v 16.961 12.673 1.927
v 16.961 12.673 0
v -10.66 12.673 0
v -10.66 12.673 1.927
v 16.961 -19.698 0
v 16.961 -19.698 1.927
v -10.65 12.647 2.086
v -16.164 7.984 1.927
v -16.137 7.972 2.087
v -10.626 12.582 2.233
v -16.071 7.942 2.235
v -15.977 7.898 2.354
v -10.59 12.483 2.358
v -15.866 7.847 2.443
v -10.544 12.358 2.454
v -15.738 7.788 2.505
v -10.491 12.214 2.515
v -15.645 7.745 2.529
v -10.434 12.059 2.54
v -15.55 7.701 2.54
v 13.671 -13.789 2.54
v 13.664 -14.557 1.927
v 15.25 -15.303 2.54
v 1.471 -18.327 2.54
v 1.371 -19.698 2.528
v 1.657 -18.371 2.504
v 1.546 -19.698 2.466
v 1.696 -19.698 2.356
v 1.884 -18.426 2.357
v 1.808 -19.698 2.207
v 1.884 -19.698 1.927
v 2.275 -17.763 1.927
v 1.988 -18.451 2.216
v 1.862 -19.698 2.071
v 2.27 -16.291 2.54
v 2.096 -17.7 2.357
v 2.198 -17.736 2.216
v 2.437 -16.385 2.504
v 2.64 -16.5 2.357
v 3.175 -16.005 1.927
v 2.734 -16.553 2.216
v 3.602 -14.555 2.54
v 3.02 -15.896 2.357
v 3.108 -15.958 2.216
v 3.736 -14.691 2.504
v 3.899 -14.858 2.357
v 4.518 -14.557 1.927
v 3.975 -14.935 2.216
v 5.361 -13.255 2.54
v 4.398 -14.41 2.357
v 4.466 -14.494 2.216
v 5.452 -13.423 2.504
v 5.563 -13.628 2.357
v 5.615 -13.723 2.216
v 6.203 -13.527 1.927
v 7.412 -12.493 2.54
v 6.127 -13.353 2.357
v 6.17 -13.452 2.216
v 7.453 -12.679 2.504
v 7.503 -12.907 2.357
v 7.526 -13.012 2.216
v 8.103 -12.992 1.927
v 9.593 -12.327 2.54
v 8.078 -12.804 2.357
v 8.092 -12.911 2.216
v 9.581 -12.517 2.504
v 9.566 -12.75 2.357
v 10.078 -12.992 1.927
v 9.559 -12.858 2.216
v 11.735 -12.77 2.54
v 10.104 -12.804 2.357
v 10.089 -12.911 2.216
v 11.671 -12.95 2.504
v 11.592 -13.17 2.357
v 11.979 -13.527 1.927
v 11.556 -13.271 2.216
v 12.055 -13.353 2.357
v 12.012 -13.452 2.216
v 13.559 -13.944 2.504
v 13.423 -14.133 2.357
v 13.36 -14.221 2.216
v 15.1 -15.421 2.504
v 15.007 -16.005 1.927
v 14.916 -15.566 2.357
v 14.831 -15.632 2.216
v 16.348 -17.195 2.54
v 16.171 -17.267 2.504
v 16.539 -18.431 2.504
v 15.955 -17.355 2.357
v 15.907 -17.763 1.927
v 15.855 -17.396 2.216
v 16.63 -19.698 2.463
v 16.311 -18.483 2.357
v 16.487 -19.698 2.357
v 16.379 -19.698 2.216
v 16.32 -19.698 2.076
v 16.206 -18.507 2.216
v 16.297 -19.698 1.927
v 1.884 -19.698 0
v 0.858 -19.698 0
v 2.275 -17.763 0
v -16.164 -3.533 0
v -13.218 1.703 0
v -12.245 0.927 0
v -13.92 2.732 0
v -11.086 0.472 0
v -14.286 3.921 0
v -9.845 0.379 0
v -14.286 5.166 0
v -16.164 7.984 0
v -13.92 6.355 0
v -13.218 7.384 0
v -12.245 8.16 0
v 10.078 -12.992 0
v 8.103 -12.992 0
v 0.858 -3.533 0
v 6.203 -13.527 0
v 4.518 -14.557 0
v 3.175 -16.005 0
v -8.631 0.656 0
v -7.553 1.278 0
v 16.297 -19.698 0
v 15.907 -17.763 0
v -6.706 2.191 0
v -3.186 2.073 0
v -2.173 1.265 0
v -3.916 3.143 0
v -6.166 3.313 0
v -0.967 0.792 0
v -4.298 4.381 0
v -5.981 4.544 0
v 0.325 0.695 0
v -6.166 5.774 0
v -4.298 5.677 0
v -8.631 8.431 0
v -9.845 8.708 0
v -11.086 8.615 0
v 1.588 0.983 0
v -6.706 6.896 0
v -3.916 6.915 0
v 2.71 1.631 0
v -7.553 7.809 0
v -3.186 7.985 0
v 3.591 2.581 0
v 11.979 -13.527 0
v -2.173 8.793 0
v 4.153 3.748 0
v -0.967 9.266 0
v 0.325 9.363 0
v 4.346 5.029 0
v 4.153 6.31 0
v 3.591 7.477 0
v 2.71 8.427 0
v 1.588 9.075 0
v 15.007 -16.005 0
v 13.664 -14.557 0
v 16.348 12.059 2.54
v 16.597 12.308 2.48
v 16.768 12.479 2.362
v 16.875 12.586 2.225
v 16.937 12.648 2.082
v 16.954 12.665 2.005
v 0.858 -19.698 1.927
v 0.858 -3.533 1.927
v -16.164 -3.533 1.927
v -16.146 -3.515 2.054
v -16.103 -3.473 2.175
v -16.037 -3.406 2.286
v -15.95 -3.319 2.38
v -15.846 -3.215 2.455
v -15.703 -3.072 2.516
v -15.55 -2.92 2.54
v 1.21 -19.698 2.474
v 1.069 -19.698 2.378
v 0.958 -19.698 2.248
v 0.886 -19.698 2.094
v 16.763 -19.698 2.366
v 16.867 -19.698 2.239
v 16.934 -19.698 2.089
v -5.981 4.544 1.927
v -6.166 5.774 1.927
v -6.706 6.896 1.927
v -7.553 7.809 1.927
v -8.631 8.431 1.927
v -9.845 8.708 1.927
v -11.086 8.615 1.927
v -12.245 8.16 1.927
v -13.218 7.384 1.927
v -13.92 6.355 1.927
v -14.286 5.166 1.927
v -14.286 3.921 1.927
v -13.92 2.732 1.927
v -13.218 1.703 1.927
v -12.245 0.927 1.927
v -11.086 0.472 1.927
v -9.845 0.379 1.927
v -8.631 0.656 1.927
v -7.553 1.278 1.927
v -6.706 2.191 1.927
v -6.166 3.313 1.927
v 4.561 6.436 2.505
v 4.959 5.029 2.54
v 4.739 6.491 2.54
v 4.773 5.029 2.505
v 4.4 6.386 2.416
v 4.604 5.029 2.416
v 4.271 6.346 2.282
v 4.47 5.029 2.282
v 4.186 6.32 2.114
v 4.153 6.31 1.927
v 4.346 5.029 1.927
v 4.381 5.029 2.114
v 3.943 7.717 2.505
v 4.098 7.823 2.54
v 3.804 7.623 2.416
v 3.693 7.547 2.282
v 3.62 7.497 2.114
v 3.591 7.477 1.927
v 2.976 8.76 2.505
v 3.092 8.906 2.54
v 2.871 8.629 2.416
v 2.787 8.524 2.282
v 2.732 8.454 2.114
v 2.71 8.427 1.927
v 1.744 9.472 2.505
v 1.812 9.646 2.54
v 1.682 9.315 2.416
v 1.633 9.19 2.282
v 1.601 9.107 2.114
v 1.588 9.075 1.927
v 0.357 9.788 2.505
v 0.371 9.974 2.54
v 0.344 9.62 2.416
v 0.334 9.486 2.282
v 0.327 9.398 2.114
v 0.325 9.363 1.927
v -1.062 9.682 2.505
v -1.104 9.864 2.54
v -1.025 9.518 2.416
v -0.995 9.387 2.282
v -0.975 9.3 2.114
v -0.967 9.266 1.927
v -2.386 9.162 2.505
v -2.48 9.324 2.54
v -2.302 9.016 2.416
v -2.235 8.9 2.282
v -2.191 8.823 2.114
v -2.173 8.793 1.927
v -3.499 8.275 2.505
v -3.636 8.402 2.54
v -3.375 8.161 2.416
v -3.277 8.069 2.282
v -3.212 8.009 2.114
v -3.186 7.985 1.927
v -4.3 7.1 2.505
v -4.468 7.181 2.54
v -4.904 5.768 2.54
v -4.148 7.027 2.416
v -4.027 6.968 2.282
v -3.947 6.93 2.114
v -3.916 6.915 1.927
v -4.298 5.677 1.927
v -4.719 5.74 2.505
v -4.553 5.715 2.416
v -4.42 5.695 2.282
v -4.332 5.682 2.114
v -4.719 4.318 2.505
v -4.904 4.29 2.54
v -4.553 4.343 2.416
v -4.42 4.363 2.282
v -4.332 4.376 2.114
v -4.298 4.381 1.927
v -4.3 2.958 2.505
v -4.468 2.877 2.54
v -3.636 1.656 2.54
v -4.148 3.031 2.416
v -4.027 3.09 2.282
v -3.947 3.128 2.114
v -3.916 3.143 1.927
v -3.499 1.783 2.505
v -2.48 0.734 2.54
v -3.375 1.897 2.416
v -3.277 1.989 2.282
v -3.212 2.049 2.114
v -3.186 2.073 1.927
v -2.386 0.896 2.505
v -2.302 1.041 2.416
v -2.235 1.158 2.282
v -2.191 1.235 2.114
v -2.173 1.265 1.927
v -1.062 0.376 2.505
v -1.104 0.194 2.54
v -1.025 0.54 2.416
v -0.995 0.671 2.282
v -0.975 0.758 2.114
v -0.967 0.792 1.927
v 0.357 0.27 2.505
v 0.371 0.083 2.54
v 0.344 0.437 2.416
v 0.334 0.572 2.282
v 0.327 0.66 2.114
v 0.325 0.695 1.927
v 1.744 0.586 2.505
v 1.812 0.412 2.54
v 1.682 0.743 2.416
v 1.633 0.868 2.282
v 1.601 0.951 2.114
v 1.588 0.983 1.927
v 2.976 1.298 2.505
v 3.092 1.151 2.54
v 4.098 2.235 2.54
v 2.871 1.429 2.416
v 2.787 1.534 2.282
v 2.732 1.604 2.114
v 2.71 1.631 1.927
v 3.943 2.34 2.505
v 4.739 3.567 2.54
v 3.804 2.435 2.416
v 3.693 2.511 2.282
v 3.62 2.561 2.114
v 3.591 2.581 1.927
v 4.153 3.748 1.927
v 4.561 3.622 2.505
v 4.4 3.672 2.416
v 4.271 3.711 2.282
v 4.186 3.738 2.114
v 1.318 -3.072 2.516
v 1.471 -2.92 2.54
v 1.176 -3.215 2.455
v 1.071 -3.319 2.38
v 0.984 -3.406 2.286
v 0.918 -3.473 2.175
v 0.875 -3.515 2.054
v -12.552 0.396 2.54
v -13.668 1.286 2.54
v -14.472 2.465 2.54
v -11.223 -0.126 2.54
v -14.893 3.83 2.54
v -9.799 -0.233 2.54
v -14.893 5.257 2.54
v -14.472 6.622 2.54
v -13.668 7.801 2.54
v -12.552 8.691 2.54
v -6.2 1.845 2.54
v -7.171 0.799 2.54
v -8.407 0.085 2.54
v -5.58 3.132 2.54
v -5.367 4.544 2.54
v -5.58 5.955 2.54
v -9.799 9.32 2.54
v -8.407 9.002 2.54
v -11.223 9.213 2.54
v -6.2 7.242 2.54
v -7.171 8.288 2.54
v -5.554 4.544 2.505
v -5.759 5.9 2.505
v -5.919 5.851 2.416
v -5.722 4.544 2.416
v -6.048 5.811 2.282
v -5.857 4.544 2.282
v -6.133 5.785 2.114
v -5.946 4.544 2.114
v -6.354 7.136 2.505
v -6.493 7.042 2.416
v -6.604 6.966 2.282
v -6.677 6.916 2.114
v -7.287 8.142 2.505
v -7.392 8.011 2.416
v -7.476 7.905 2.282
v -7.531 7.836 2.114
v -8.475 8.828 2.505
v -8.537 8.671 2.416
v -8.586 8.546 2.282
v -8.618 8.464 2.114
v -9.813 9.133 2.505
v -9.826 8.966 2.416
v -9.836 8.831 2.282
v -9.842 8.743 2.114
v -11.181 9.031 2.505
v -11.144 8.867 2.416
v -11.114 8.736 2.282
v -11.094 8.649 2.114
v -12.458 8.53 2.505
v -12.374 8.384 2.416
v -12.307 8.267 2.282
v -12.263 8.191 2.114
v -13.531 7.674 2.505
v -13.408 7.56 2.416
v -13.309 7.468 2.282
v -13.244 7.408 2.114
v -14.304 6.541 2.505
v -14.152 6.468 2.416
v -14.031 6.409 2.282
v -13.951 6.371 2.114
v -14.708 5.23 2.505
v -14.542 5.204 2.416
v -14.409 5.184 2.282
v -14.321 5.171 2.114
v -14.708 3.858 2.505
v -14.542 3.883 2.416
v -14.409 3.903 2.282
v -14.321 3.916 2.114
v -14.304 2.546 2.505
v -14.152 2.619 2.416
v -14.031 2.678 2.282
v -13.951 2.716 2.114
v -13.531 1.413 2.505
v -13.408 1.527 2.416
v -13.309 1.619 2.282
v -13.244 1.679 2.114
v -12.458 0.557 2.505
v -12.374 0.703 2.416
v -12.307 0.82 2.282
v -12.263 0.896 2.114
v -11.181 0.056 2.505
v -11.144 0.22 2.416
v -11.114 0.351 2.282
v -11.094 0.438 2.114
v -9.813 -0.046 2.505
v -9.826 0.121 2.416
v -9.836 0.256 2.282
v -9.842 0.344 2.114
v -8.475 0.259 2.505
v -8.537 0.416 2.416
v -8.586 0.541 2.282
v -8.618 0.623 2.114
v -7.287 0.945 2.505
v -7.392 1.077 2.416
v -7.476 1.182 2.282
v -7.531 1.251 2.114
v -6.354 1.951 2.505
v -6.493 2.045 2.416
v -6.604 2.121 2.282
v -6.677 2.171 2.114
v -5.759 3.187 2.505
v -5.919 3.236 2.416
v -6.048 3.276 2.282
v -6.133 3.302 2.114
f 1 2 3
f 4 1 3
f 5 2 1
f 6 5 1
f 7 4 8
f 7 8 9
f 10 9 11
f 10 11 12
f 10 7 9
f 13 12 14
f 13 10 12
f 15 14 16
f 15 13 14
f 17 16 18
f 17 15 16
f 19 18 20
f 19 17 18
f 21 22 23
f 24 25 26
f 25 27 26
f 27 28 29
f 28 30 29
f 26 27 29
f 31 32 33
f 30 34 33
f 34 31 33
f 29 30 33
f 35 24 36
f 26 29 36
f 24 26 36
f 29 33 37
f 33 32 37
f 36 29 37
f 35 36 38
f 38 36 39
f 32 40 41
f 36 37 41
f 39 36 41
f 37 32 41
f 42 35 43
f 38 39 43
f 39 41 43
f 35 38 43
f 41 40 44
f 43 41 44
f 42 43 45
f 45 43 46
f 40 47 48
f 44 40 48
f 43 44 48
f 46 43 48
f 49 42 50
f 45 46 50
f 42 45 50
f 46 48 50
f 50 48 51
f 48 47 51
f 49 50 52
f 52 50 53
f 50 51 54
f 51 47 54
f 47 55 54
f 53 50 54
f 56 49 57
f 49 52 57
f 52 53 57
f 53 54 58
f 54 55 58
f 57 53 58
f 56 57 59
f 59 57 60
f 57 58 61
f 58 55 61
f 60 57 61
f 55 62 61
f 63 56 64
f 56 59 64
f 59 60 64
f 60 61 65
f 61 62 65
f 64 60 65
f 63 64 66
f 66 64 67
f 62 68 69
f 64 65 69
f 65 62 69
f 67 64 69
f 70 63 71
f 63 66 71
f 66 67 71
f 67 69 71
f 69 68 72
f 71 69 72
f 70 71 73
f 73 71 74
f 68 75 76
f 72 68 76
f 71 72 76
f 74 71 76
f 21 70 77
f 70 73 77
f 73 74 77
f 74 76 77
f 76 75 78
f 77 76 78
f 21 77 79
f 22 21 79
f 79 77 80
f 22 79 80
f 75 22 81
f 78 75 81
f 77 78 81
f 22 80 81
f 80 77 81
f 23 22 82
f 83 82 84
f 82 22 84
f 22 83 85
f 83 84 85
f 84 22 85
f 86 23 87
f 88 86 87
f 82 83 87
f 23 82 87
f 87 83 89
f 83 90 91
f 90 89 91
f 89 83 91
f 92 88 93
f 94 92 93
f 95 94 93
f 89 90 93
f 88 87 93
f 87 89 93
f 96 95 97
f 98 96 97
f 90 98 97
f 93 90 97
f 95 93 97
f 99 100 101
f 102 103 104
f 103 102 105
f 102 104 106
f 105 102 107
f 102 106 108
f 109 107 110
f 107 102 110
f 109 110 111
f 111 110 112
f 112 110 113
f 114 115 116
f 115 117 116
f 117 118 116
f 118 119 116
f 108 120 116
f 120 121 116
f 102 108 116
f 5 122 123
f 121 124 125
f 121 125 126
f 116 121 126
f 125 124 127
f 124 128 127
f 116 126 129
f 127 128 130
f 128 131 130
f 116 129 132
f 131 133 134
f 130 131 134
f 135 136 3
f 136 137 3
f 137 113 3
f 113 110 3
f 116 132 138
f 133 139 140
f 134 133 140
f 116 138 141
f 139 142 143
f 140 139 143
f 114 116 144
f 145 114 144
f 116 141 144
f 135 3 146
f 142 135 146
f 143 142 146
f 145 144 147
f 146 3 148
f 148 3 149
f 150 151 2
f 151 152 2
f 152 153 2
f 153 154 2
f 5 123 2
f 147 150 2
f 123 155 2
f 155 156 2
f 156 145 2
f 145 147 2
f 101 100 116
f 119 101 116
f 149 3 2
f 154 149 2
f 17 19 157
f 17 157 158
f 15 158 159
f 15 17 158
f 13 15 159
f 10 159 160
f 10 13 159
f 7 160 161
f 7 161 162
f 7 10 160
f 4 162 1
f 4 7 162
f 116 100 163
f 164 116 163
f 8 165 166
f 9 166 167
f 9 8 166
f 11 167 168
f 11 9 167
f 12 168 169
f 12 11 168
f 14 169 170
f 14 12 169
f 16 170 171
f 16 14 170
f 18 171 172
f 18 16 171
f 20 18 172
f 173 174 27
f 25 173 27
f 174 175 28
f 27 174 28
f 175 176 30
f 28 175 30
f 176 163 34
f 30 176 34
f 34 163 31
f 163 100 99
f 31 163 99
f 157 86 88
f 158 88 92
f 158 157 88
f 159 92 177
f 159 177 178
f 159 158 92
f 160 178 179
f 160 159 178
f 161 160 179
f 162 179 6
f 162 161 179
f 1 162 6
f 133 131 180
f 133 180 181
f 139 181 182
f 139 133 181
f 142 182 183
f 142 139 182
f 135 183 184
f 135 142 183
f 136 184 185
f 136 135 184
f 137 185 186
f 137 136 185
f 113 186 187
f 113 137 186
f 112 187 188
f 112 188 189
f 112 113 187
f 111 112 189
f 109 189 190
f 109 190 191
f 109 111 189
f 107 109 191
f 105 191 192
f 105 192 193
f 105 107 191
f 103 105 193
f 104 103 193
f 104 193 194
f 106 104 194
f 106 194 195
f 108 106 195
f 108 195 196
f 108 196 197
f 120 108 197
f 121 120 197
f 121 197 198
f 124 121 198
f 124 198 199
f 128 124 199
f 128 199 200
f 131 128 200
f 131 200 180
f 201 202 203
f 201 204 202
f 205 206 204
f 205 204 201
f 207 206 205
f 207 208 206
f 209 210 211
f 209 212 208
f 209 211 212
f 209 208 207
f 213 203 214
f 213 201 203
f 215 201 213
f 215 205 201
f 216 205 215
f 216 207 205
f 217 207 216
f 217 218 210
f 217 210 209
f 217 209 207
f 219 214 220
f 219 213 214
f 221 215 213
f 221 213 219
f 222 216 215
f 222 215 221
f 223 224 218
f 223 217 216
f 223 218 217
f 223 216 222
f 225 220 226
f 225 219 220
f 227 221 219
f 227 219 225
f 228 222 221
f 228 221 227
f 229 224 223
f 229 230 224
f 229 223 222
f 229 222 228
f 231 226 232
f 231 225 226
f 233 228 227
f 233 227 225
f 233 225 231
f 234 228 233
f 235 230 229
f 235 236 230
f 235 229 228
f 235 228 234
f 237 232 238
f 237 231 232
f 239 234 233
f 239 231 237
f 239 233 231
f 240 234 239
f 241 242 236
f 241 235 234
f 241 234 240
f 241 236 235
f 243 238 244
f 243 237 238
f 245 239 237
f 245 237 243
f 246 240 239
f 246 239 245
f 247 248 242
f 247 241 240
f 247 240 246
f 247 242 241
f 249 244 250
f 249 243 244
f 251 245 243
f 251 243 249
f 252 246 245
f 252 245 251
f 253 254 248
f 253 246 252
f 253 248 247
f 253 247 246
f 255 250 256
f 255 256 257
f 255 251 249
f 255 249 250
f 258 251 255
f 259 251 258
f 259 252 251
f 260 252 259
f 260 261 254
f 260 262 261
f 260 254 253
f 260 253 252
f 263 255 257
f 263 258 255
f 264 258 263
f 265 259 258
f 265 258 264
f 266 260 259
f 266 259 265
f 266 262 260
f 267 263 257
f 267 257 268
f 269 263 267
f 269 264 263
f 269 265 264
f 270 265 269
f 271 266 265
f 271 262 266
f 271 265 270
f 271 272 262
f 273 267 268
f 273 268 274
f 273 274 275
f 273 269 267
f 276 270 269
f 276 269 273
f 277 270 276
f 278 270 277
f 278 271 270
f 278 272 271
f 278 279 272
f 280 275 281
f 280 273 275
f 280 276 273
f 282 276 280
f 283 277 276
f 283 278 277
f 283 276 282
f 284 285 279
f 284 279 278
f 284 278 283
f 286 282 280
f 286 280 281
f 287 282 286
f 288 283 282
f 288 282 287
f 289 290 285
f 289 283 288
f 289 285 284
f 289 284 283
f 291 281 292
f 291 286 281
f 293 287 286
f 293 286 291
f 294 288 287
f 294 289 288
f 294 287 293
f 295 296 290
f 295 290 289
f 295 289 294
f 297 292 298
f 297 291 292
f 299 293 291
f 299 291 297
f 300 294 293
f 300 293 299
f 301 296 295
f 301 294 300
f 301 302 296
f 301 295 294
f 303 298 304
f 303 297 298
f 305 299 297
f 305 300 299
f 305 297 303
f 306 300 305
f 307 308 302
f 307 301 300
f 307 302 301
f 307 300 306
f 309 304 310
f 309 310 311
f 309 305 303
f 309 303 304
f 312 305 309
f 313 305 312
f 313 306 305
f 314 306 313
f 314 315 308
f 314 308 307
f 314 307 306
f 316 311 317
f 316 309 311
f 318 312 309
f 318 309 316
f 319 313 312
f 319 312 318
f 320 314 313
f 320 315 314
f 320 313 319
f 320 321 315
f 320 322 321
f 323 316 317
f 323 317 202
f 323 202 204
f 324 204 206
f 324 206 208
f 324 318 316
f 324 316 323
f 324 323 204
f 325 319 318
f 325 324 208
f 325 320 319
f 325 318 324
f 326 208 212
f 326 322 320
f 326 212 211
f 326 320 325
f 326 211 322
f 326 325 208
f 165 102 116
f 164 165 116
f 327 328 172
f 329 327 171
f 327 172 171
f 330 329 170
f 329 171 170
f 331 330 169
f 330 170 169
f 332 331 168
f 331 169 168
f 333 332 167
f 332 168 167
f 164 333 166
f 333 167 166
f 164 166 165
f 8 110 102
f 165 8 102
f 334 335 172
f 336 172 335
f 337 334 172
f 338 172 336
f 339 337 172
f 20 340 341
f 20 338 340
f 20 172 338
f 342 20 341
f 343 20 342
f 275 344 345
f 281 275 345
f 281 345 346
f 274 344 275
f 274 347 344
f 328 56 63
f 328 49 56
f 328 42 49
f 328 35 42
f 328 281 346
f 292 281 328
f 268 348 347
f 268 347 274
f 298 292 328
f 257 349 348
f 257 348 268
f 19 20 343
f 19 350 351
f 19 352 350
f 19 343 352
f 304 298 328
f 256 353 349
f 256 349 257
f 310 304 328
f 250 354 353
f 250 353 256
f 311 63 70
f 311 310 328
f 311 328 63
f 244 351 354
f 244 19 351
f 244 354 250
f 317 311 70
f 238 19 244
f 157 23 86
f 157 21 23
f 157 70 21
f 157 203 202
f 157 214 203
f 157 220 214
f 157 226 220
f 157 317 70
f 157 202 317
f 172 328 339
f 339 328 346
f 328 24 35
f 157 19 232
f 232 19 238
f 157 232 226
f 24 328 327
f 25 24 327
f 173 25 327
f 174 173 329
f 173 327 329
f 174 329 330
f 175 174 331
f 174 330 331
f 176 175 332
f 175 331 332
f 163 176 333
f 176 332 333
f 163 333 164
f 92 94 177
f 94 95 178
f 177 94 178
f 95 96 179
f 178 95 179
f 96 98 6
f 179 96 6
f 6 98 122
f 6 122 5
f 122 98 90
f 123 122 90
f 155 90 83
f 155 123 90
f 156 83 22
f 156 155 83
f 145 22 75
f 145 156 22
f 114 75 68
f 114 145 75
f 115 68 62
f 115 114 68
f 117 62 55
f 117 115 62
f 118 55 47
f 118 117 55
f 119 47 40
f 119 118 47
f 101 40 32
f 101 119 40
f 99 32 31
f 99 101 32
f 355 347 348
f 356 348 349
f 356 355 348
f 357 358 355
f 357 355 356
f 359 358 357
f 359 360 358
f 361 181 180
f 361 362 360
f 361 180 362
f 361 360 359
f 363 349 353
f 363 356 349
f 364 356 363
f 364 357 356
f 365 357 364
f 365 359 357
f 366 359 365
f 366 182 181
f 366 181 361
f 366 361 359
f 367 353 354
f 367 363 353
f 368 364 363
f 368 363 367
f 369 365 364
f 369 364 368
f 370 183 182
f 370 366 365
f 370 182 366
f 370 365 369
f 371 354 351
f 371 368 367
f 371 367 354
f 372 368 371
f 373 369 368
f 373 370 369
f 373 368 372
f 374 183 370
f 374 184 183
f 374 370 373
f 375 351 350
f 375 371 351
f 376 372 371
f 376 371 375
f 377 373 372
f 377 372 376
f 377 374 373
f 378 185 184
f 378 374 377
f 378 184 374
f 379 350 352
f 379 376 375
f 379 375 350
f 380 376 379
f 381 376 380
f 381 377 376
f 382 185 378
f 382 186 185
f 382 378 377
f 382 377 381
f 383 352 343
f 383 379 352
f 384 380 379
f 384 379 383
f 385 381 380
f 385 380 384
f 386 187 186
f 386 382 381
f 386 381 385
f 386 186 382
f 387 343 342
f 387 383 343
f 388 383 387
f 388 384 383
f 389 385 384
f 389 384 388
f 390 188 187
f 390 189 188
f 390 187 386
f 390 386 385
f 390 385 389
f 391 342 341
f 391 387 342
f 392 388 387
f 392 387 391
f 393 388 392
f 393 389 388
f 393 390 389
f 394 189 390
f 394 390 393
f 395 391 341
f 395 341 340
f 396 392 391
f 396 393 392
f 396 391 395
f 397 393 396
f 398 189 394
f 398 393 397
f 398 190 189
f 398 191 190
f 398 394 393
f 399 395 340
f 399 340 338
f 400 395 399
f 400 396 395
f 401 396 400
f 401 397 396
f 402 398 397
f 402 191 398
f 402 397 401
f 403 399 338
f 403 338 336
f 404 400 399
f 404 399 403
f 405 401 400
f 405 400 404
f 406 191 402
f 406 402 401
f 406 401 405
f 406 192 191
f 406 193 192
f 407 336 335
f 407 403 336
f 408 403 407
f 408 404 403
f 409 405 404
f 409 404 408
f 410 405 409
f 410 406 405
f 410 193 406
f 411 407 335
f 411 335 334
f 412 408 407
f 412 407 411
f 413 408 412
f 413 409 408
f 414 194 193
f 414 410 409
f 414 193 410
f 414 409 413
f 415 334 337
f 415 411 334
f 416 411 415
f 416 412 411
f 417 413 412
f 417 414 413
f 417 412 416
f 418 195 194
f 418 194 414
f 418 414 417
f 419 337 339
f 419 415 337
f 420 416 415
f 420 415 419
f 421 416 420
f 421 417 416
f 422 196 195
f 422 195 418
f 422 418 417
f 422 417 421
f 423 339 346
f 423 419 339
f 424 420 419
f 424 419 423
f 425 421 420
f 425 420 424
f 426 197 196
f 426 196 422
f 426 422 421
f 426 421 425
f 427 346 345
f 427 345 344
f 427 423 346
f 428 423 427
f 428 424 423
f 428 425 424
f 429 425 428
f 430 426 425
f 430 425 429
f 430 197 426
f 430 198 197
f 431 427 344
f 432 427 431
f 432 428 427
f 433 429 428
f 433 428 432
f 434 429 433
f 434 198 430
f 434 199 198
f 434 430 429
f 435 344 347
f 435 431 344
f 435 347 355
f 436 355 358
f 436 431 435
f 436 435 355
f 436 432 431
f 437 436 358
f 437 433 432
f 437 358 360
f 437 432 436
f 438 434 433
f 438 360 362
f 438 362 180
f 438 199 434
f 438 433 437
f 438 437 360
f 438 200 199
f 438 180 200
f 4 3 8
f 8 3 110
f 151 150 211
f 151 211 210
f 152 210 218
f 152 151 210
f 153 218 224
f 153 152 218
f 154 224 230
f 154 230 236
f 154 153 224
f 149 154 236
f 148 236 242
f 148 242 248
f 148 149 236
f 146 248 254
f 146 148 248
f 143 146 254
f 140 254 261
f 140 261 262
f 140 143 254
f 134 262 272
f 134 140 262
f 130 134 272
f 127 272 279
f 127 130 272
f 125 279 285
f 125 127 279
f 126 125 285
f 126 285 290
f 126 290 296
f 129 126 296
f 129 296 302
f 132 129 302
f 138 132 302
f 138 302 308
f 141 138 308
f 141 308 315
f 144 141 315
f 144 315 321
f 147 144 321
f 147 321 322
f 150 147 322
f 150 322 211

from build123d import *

# Parameters (mm, degrees)
F0_R         = 4.1761867796
F0_R_2       = 4.3460448691
F1_DEPTH     = 2.54
F2_DEPTH     = 12.7
F3_R         = 7.2200461369
F4_DEPTH     = 12.7
F7_T1_DEPTH  = 14.697191958
F7_T3_DEPTH  = 10.4099383433
F7_T5_DEPTH  = 30.8011159773
F7_T7_DEPTH  = 35.5510768625
F7_T9_DEPTH  = 17.7553157696
F7_T11_DEPTH = 18.6111496066
F7_T14_ANGLE = 198.1944914786
F7_T23_DEPTH = 17.7553157696
F7_T27_DEPTH = 18.6111496066


# Not quite as in the source:
# - a fillet or chamfer that OpenCascade refuses, or shapes differently, is made with other operations: its cross-section is extruded or revolved along the edge and cut away or added


with BuildPart() as f1:
    # F0 (on Top) → F1 (new body)
    with BuildSketch(Plane.XY):
        Polygon((-16.1636956036, 7.9843616113), (-16.1636956036, 0), (-16.1636956036, -3.5330012906), (0.857539475, -3.5330012906), (0.857539475, -6.9984025322), (16.9614627957, -6.9984025322), (16.9614627957, 0), (16.9614627957, 12.6728452742), (-10.6598241255, 12.6728452742), align=None)
        with Locations((-10.1569462568, 4.5435167849)):
            Circle(F0_R, mode=Mode.SUBTRACT)
        with Locations((0, 5.0288974307)):
            Circle(F0_R_2, mode=Mode.SUBTRACT)
    extrude(amount=F1_DEPTH)

    # F2 (add): a face of the model
    f2_faces = [f1.faces().sort_by_distance(p)[0] for p in [
        (8.9095011353, -6.9984025322, 1.27),
    ]]
    extrude(f2_faces, amount=F2_DEPTH)


with BuildPart() as f4:
    # F3 (on Top) → F4 (new body)
    with BuildSketch(Plane.XY):
        with Locations((6.5507800318, -27.7640167624)):
            Circle(F3_R)
    extrude(amount=F4_DEPTH)


with BuildPart() as f4_1:
    # F5: moved
    add(f4.part.moved(Location((2.54, 7.62, 0))))


with BuildPart() as f1_1:
    add(f1.part)

    # F6: cut F4
    add(f4_1.part, mode=Mode.SUBTRACT)

    # F7: fillet of radius 0.635 on 11 edges, made by hand

    # F7_s2 → F7_t1 (cut)
    with BuildSketch(Plane.XZ.offset(-9.5742761394)):
        with BuildLine():
            ThreePointArc((-16.1640956036, 1.9040343146), (-15.9777084097, 2.3540128061), (-15.5277299182, 2.5404))
            Line((-15.5277299182, 2.5404), (-15.5277299182, 2.6040365685))
            ThreePointArc((-15.5277299182, 2.6040365685), (-15.8457127609, 2.6036365685), (-16.1636956036, 2.6036365685))
            Line((-16.1636956036, 2.6036365685), (-16.2273321722, 2.54))
            ThreePointArc((-16.2273321722, 2.54), (-16.2273321722, 2.2220171573), (-16.2277321722, 1.9040343146))
            Line((-16.2277321722, 1.9040343146), (-16.1640956036, 1.9040343146))
        make_face()
    extrude(amount=F7_T1_DEPTH, mode=Mode.SUBTRACT)

    # F7_s4 → F7_t3 (cut)
    with BuildSketch(Plane(origin=(1.2888696755, 1.0979261491, 0), x_dir=(0, 0, 1), z_dir=(-0.7612431928, -0.6484664998, 0))):
        with BuildLine():
            ThreePointArc((1.9040343146, 16.560056038), (2.3540128061, 16.373668844), (2.5404, 15.9236903525))
            Line((2.5404, 15.9236903525), (2.6040365685, 15.9236903525))
            ThreePointArc((2.6040365685, 15.9236903525), (2.6036365685, 16.2416731952), (2.6036365685, 16.559656038))
            Line((2.6036365685, 16.559656038), (2.54, 16.6232926065))
            ThreePointArc((2.54, 16.6232926065), (2.2220171573, 16.6232926065), (1.9040343146, 16.6236926065))
            Line((1.9040343146, 16.6236926065), (1.9040343146, 16.560056038))
        make_face()
    extrude(amount=F7_T3_DEPTH, mode=Mode.SUBTRACT)

    # F7_s6 → F7_t5 (cut)
    with BuildSketch(Plane.YZ.offset(-12.2497386535)):
        with BuildLine():
            ThreePointArc((12.0368795888, 2.5404), (12.4868580803, 2.3540128061), (12.6732452742, 1.9040343146))
            Line((12.6732452742, 1.9040343146), (12.7368818428, 1.9040343146))
            ThreePointArc((12.7368818428, 1.9040343146), (12.7364818428, 2.2220171573), (12.7364818428, 2.54))
            Line((12.7364818428, 2.54), (12.6728452742, 2.6036365685))
            ThreePointArc((12.6728452742, 2.6036365685), (12.3548624315, 2.6036365685), (12.0368795888, 2.6040365685))
            Line((12.0368795888, 2.6040365685), (12.0368795888, 2.5404))
        make_face()
    extrude(amount=F7_T5_DEPTH, mode=Mode.SUBTRACT)

    # F7_s8 → F7_t7 (cut)
    with BuildSketch(Plane.XZ.offset(-14.2627598023)):
        with BuildLine():
            ThreePointArc((16.3254971103, 2.5404), (16.7754756018, 2.3540128061), (16.9618627957, 1.9040343146))
            Line((16.9618627957, 1.9040343146), (17.0254993643, 1.9040343146))
            ThreePointArc((17.0254993643, 1.9040343146), (17.0250993643, 2.2220171573), (17.0250993643, 2.54))
            Line((17.0250993643, 2.54), (16.9614627957, 2.6036365685))
            ThreePointArc((16.9614627957, 2.6036365685), (16.643479953, 2.6036365685), (16.3254971103, 2.6040365685))
            Line((16.3254971103, 2.6040365685), (16.3254971103, 2.5404))
        make_face()
    extrude(amount=F7_T7_DEPTH, mode=Mode.SUBTRACT)

    # F7_s10 → F7_t9 (cut)
    with BuildSketch(Plane.XZ.offset(3.5330012906)):
        with BuildLine():
            ThreePointArc((1.4935051604, 2.5404), (1.0435266689, 2.3540128061), (0.857139475, 1.9040343146))
            Line((0.857139475, 1.9040343146), (0.7935029064, 1.9040343146))
            ThreePointArc((0.7935029064, 1.9040343146), (0.7939029064, 2.2220171573), (0.7939029064, 2.54))
            Line((0.7939029064, 2.54), (0.857539475, 2.6036365685))
            ThreePointArc((0.857539475, 2.6036365685), (1.1755223177, 2.6036365685), (1.4935051604, 2.6040365685))
            Line((1.4935051604, 2.6040365685), (1.4935051604, 2.5404))
        make_face()
    extrude(amount=F7_T9_DEPTH, mode=Mode.SUBTRACT)

    # F7_s12 → F7_t11 (cut)
    with BuildSketch(Plane.YZ.offset(-17.7536101317)):
        with BuildLine():
            ThreePointArc((-2.8970356052, 2.5404), (-3.3470140967, 2.3540128061), (-3.5334012906, 1.9040343146))
            Line((-3.5334012906, 1.9040343146), (-3.5970378592, 1.9040343146))
            ThreePointArc((-3.5970378592, 1.9040343146), (-3.5966378592, 2.2220171573), (-3.5966378592, 2.54))
            Line((-3.5966378592, 2.54), (-3.5330012906, 2.6036365685))
            ThreePointArc((-3.5330012906, 2.6036365685), (-3.2150184479, 2.6036365685), (-2.8970356052, 2.6040365685))
            Line((-2.8970356052, 2.6040365685), (-2.8970356052, 2.5404))
        make_face()
    extrude(amount=F7_T11_DEPTH, mode=Mode.SUBTRACT)

    # F7_s13 → F7_t14 (revolve, cut)
    with BuildSketch(Plane(origin=(3.3721800717, -21.0597061225, 0), x_dir=(0, 0, 1), z_dir=(0.1581106012, -0.9874214084, 0))):
        with BuildLine():
            ThreePointArc((2.5404, 2.0645636003), (2.3540128061, 1.6145851088), (1.9040343146, 1.4281979149))
            Line((1.9040343146, 1.4281979149), (1.9040343146, 1.3645613463))
            ThreePointArc((1.9040343146, 1.3645613463), (2.2220171573, 1.3649613463), (2.54, 1.3649613463))
            Line((2.54, 1.3649613463), (2.6036365685, 1.4285979149))
            ThreePointArc((2.6036365685, 1.4285979149), (2.6036365685, 1.7465807576), (2.6040365685, 2.0645636003))
            Line((2.6040365685, 2.0645636003), (2.5404, 2.0645636003))
        make_face()
    revolve(axis=Axis((9.0907800318, -20.1440167624, 2.54), (0, 0, -1)), revolution_arc=F7_T14_ANGLE, mode=Mode.SUBTRACT)

    # F7_s15 → F7_t16 (revolve, cut)
    with BuildSketch(Plane.XZ.offset(-4.5435167849)):
        with BuildLine():
            ThreePointArc((-5.3447937917, 2.5404), (-5.7947722832, 2.3540128061), (-5.9811594771, 1.9040343146))
            Line((-5.9811594771, 1.9040343146), (-6.0447960457, 1.9040343146))
            ThreePointArc((-6.0447960457, 1.9040343146), (-6.0443960457, 2.2220171573), (-6.0443960457, 2.54))
            Line((-6.0443960457, 2.54), (-5.9807594771, 2.6036365685))
            ThreePointArc((-5.9807594771, 2.6036365685), (-5.6627766344, 2.6036365685), (-5.3447937917, 2.6040365685))
            Line((-5.3447937917, 2.6040365685), (-5.3447937917, 2.5404))
        make_face()
    revolve(axis=Axis((-10.1569462568, 4.5435167849, 2.54), (0, 0, 1)), mode=Mode.SUBTRACT)

    # F7_s17 → F7_t18 (revolve, cut)
    with BuildSketch(Plane.XZ.offset(-5.0288974307)):
        with BuildLine():
            ThreePointArc((4.9820105545, 2.5404), (4.532032063, 2.3540128061), (4.3456448691, 1.9040343146))
            Line((4.3456448691, 1.9040343146), (4.2820083005, 1.9040343146))
            ThreePointArc((4.2820083005, 1.9040343146), (4.2824083005, 2.2220171573), (4.2824083005, 2.54))
            Line((4.2824083005, 2.54), (4.3460448691, 2.6036365685))
            ThreePointArc((4.3460448691, 2.6036365685), (4.6640277118, 2.6036365685), (4.9820105545, 2.6040365685))
            Line((4.9820105545, 2.6040365685), (4.9820105545, 2.5404))
        make_face()
    revolve(axis=Axis((0, 5.0288974307, 2.54), (0, 0, 1)), mode=Mode.SUBTRACT)


with BuildPart() as f7_tool21:
    # F7_s22 → F7_t23 (new body)
    with BuildSketch(Plane.XZ.offset(1.9430867626)):
        with BuildLine():
            ThreePointArc((1.4935051604, 2.5404), (1.0435266689, 2.3540128061), (0.857139475, 1.9040343146))
            Line((0.857139475, 1.9040343146), (0.7935029064, 1.9040343146))
            ThreePointArc((0.7935029064, 1.9040343146), (0.7939029064, 2.2220171573), (0.7939029064, 2.54))
            Line((0.7939029064, 2.54), (0.857539475, 2.6036365685))
            ThreePointArc((0.857539475, 2.6036365685), (1.1755223177, 2.6036365685), (1.4935051604, 2.6040365685))
            Line((1.4935051604, 2.6040365685), (1.4935051604, 2.5404))
        make_face()
    extrude(amount=F7_T23_DEPTH)

    split(bisect_by=Plane.XZ.offset(3.5330012906), keep=Keep.BOTTOM)


with BuildPart() as f7_tool25:
    # F7_s26 → F7_t27 (new body)
    with BuildSketch(Plane.YZ.offset(-16.1636956036)):
        with BuildLine():
            ThreePointArc((-2.8970356052, 2.5404), (-3.3470140967, 2.3540128061), (-3.5334012906, 1.9040343146))
            Line((-3.5334012906, 1.9040343146), (-3.5970378592, 1.9040343146))
            ThreePointArc((-3.5970378592, 1.9040343146), (-3.5966378592, 2.2220171573), (-3.5966378592, 2.54))
            Line((-3.5966378592, 2.54), (-3.5330012906, 2.6036365685))
            ThreePointArc((-3.5330012906, 2.6036365685), (-3.2150184479, 2.6036365685), (-2.8970356052, 2.6040365685))
            Line((-2.8970356052, 2.6040365685), (-2.8970356052, 2.5404))
        make_face()
    extrude(amount=F7_T27_DEPTH)

    split(bisect_by=Plane.YZ.offset(0.857539475), keep=Keep.TOP)


with BuildPart() as f7_tool21_1:
    add(f7_tool21.part)

    # F7_t29: intersect F7_tool25
    add(f7_tool25.part, mode=Mode.INTERSECT)


with BuildPart() as f1_2:
    add(f1_1.part)

    # F7_t19: cut F7_tool21
    add(f7_tool21_1.part, mode=Mode.SUBTRACT)


solid = f1_2.part
